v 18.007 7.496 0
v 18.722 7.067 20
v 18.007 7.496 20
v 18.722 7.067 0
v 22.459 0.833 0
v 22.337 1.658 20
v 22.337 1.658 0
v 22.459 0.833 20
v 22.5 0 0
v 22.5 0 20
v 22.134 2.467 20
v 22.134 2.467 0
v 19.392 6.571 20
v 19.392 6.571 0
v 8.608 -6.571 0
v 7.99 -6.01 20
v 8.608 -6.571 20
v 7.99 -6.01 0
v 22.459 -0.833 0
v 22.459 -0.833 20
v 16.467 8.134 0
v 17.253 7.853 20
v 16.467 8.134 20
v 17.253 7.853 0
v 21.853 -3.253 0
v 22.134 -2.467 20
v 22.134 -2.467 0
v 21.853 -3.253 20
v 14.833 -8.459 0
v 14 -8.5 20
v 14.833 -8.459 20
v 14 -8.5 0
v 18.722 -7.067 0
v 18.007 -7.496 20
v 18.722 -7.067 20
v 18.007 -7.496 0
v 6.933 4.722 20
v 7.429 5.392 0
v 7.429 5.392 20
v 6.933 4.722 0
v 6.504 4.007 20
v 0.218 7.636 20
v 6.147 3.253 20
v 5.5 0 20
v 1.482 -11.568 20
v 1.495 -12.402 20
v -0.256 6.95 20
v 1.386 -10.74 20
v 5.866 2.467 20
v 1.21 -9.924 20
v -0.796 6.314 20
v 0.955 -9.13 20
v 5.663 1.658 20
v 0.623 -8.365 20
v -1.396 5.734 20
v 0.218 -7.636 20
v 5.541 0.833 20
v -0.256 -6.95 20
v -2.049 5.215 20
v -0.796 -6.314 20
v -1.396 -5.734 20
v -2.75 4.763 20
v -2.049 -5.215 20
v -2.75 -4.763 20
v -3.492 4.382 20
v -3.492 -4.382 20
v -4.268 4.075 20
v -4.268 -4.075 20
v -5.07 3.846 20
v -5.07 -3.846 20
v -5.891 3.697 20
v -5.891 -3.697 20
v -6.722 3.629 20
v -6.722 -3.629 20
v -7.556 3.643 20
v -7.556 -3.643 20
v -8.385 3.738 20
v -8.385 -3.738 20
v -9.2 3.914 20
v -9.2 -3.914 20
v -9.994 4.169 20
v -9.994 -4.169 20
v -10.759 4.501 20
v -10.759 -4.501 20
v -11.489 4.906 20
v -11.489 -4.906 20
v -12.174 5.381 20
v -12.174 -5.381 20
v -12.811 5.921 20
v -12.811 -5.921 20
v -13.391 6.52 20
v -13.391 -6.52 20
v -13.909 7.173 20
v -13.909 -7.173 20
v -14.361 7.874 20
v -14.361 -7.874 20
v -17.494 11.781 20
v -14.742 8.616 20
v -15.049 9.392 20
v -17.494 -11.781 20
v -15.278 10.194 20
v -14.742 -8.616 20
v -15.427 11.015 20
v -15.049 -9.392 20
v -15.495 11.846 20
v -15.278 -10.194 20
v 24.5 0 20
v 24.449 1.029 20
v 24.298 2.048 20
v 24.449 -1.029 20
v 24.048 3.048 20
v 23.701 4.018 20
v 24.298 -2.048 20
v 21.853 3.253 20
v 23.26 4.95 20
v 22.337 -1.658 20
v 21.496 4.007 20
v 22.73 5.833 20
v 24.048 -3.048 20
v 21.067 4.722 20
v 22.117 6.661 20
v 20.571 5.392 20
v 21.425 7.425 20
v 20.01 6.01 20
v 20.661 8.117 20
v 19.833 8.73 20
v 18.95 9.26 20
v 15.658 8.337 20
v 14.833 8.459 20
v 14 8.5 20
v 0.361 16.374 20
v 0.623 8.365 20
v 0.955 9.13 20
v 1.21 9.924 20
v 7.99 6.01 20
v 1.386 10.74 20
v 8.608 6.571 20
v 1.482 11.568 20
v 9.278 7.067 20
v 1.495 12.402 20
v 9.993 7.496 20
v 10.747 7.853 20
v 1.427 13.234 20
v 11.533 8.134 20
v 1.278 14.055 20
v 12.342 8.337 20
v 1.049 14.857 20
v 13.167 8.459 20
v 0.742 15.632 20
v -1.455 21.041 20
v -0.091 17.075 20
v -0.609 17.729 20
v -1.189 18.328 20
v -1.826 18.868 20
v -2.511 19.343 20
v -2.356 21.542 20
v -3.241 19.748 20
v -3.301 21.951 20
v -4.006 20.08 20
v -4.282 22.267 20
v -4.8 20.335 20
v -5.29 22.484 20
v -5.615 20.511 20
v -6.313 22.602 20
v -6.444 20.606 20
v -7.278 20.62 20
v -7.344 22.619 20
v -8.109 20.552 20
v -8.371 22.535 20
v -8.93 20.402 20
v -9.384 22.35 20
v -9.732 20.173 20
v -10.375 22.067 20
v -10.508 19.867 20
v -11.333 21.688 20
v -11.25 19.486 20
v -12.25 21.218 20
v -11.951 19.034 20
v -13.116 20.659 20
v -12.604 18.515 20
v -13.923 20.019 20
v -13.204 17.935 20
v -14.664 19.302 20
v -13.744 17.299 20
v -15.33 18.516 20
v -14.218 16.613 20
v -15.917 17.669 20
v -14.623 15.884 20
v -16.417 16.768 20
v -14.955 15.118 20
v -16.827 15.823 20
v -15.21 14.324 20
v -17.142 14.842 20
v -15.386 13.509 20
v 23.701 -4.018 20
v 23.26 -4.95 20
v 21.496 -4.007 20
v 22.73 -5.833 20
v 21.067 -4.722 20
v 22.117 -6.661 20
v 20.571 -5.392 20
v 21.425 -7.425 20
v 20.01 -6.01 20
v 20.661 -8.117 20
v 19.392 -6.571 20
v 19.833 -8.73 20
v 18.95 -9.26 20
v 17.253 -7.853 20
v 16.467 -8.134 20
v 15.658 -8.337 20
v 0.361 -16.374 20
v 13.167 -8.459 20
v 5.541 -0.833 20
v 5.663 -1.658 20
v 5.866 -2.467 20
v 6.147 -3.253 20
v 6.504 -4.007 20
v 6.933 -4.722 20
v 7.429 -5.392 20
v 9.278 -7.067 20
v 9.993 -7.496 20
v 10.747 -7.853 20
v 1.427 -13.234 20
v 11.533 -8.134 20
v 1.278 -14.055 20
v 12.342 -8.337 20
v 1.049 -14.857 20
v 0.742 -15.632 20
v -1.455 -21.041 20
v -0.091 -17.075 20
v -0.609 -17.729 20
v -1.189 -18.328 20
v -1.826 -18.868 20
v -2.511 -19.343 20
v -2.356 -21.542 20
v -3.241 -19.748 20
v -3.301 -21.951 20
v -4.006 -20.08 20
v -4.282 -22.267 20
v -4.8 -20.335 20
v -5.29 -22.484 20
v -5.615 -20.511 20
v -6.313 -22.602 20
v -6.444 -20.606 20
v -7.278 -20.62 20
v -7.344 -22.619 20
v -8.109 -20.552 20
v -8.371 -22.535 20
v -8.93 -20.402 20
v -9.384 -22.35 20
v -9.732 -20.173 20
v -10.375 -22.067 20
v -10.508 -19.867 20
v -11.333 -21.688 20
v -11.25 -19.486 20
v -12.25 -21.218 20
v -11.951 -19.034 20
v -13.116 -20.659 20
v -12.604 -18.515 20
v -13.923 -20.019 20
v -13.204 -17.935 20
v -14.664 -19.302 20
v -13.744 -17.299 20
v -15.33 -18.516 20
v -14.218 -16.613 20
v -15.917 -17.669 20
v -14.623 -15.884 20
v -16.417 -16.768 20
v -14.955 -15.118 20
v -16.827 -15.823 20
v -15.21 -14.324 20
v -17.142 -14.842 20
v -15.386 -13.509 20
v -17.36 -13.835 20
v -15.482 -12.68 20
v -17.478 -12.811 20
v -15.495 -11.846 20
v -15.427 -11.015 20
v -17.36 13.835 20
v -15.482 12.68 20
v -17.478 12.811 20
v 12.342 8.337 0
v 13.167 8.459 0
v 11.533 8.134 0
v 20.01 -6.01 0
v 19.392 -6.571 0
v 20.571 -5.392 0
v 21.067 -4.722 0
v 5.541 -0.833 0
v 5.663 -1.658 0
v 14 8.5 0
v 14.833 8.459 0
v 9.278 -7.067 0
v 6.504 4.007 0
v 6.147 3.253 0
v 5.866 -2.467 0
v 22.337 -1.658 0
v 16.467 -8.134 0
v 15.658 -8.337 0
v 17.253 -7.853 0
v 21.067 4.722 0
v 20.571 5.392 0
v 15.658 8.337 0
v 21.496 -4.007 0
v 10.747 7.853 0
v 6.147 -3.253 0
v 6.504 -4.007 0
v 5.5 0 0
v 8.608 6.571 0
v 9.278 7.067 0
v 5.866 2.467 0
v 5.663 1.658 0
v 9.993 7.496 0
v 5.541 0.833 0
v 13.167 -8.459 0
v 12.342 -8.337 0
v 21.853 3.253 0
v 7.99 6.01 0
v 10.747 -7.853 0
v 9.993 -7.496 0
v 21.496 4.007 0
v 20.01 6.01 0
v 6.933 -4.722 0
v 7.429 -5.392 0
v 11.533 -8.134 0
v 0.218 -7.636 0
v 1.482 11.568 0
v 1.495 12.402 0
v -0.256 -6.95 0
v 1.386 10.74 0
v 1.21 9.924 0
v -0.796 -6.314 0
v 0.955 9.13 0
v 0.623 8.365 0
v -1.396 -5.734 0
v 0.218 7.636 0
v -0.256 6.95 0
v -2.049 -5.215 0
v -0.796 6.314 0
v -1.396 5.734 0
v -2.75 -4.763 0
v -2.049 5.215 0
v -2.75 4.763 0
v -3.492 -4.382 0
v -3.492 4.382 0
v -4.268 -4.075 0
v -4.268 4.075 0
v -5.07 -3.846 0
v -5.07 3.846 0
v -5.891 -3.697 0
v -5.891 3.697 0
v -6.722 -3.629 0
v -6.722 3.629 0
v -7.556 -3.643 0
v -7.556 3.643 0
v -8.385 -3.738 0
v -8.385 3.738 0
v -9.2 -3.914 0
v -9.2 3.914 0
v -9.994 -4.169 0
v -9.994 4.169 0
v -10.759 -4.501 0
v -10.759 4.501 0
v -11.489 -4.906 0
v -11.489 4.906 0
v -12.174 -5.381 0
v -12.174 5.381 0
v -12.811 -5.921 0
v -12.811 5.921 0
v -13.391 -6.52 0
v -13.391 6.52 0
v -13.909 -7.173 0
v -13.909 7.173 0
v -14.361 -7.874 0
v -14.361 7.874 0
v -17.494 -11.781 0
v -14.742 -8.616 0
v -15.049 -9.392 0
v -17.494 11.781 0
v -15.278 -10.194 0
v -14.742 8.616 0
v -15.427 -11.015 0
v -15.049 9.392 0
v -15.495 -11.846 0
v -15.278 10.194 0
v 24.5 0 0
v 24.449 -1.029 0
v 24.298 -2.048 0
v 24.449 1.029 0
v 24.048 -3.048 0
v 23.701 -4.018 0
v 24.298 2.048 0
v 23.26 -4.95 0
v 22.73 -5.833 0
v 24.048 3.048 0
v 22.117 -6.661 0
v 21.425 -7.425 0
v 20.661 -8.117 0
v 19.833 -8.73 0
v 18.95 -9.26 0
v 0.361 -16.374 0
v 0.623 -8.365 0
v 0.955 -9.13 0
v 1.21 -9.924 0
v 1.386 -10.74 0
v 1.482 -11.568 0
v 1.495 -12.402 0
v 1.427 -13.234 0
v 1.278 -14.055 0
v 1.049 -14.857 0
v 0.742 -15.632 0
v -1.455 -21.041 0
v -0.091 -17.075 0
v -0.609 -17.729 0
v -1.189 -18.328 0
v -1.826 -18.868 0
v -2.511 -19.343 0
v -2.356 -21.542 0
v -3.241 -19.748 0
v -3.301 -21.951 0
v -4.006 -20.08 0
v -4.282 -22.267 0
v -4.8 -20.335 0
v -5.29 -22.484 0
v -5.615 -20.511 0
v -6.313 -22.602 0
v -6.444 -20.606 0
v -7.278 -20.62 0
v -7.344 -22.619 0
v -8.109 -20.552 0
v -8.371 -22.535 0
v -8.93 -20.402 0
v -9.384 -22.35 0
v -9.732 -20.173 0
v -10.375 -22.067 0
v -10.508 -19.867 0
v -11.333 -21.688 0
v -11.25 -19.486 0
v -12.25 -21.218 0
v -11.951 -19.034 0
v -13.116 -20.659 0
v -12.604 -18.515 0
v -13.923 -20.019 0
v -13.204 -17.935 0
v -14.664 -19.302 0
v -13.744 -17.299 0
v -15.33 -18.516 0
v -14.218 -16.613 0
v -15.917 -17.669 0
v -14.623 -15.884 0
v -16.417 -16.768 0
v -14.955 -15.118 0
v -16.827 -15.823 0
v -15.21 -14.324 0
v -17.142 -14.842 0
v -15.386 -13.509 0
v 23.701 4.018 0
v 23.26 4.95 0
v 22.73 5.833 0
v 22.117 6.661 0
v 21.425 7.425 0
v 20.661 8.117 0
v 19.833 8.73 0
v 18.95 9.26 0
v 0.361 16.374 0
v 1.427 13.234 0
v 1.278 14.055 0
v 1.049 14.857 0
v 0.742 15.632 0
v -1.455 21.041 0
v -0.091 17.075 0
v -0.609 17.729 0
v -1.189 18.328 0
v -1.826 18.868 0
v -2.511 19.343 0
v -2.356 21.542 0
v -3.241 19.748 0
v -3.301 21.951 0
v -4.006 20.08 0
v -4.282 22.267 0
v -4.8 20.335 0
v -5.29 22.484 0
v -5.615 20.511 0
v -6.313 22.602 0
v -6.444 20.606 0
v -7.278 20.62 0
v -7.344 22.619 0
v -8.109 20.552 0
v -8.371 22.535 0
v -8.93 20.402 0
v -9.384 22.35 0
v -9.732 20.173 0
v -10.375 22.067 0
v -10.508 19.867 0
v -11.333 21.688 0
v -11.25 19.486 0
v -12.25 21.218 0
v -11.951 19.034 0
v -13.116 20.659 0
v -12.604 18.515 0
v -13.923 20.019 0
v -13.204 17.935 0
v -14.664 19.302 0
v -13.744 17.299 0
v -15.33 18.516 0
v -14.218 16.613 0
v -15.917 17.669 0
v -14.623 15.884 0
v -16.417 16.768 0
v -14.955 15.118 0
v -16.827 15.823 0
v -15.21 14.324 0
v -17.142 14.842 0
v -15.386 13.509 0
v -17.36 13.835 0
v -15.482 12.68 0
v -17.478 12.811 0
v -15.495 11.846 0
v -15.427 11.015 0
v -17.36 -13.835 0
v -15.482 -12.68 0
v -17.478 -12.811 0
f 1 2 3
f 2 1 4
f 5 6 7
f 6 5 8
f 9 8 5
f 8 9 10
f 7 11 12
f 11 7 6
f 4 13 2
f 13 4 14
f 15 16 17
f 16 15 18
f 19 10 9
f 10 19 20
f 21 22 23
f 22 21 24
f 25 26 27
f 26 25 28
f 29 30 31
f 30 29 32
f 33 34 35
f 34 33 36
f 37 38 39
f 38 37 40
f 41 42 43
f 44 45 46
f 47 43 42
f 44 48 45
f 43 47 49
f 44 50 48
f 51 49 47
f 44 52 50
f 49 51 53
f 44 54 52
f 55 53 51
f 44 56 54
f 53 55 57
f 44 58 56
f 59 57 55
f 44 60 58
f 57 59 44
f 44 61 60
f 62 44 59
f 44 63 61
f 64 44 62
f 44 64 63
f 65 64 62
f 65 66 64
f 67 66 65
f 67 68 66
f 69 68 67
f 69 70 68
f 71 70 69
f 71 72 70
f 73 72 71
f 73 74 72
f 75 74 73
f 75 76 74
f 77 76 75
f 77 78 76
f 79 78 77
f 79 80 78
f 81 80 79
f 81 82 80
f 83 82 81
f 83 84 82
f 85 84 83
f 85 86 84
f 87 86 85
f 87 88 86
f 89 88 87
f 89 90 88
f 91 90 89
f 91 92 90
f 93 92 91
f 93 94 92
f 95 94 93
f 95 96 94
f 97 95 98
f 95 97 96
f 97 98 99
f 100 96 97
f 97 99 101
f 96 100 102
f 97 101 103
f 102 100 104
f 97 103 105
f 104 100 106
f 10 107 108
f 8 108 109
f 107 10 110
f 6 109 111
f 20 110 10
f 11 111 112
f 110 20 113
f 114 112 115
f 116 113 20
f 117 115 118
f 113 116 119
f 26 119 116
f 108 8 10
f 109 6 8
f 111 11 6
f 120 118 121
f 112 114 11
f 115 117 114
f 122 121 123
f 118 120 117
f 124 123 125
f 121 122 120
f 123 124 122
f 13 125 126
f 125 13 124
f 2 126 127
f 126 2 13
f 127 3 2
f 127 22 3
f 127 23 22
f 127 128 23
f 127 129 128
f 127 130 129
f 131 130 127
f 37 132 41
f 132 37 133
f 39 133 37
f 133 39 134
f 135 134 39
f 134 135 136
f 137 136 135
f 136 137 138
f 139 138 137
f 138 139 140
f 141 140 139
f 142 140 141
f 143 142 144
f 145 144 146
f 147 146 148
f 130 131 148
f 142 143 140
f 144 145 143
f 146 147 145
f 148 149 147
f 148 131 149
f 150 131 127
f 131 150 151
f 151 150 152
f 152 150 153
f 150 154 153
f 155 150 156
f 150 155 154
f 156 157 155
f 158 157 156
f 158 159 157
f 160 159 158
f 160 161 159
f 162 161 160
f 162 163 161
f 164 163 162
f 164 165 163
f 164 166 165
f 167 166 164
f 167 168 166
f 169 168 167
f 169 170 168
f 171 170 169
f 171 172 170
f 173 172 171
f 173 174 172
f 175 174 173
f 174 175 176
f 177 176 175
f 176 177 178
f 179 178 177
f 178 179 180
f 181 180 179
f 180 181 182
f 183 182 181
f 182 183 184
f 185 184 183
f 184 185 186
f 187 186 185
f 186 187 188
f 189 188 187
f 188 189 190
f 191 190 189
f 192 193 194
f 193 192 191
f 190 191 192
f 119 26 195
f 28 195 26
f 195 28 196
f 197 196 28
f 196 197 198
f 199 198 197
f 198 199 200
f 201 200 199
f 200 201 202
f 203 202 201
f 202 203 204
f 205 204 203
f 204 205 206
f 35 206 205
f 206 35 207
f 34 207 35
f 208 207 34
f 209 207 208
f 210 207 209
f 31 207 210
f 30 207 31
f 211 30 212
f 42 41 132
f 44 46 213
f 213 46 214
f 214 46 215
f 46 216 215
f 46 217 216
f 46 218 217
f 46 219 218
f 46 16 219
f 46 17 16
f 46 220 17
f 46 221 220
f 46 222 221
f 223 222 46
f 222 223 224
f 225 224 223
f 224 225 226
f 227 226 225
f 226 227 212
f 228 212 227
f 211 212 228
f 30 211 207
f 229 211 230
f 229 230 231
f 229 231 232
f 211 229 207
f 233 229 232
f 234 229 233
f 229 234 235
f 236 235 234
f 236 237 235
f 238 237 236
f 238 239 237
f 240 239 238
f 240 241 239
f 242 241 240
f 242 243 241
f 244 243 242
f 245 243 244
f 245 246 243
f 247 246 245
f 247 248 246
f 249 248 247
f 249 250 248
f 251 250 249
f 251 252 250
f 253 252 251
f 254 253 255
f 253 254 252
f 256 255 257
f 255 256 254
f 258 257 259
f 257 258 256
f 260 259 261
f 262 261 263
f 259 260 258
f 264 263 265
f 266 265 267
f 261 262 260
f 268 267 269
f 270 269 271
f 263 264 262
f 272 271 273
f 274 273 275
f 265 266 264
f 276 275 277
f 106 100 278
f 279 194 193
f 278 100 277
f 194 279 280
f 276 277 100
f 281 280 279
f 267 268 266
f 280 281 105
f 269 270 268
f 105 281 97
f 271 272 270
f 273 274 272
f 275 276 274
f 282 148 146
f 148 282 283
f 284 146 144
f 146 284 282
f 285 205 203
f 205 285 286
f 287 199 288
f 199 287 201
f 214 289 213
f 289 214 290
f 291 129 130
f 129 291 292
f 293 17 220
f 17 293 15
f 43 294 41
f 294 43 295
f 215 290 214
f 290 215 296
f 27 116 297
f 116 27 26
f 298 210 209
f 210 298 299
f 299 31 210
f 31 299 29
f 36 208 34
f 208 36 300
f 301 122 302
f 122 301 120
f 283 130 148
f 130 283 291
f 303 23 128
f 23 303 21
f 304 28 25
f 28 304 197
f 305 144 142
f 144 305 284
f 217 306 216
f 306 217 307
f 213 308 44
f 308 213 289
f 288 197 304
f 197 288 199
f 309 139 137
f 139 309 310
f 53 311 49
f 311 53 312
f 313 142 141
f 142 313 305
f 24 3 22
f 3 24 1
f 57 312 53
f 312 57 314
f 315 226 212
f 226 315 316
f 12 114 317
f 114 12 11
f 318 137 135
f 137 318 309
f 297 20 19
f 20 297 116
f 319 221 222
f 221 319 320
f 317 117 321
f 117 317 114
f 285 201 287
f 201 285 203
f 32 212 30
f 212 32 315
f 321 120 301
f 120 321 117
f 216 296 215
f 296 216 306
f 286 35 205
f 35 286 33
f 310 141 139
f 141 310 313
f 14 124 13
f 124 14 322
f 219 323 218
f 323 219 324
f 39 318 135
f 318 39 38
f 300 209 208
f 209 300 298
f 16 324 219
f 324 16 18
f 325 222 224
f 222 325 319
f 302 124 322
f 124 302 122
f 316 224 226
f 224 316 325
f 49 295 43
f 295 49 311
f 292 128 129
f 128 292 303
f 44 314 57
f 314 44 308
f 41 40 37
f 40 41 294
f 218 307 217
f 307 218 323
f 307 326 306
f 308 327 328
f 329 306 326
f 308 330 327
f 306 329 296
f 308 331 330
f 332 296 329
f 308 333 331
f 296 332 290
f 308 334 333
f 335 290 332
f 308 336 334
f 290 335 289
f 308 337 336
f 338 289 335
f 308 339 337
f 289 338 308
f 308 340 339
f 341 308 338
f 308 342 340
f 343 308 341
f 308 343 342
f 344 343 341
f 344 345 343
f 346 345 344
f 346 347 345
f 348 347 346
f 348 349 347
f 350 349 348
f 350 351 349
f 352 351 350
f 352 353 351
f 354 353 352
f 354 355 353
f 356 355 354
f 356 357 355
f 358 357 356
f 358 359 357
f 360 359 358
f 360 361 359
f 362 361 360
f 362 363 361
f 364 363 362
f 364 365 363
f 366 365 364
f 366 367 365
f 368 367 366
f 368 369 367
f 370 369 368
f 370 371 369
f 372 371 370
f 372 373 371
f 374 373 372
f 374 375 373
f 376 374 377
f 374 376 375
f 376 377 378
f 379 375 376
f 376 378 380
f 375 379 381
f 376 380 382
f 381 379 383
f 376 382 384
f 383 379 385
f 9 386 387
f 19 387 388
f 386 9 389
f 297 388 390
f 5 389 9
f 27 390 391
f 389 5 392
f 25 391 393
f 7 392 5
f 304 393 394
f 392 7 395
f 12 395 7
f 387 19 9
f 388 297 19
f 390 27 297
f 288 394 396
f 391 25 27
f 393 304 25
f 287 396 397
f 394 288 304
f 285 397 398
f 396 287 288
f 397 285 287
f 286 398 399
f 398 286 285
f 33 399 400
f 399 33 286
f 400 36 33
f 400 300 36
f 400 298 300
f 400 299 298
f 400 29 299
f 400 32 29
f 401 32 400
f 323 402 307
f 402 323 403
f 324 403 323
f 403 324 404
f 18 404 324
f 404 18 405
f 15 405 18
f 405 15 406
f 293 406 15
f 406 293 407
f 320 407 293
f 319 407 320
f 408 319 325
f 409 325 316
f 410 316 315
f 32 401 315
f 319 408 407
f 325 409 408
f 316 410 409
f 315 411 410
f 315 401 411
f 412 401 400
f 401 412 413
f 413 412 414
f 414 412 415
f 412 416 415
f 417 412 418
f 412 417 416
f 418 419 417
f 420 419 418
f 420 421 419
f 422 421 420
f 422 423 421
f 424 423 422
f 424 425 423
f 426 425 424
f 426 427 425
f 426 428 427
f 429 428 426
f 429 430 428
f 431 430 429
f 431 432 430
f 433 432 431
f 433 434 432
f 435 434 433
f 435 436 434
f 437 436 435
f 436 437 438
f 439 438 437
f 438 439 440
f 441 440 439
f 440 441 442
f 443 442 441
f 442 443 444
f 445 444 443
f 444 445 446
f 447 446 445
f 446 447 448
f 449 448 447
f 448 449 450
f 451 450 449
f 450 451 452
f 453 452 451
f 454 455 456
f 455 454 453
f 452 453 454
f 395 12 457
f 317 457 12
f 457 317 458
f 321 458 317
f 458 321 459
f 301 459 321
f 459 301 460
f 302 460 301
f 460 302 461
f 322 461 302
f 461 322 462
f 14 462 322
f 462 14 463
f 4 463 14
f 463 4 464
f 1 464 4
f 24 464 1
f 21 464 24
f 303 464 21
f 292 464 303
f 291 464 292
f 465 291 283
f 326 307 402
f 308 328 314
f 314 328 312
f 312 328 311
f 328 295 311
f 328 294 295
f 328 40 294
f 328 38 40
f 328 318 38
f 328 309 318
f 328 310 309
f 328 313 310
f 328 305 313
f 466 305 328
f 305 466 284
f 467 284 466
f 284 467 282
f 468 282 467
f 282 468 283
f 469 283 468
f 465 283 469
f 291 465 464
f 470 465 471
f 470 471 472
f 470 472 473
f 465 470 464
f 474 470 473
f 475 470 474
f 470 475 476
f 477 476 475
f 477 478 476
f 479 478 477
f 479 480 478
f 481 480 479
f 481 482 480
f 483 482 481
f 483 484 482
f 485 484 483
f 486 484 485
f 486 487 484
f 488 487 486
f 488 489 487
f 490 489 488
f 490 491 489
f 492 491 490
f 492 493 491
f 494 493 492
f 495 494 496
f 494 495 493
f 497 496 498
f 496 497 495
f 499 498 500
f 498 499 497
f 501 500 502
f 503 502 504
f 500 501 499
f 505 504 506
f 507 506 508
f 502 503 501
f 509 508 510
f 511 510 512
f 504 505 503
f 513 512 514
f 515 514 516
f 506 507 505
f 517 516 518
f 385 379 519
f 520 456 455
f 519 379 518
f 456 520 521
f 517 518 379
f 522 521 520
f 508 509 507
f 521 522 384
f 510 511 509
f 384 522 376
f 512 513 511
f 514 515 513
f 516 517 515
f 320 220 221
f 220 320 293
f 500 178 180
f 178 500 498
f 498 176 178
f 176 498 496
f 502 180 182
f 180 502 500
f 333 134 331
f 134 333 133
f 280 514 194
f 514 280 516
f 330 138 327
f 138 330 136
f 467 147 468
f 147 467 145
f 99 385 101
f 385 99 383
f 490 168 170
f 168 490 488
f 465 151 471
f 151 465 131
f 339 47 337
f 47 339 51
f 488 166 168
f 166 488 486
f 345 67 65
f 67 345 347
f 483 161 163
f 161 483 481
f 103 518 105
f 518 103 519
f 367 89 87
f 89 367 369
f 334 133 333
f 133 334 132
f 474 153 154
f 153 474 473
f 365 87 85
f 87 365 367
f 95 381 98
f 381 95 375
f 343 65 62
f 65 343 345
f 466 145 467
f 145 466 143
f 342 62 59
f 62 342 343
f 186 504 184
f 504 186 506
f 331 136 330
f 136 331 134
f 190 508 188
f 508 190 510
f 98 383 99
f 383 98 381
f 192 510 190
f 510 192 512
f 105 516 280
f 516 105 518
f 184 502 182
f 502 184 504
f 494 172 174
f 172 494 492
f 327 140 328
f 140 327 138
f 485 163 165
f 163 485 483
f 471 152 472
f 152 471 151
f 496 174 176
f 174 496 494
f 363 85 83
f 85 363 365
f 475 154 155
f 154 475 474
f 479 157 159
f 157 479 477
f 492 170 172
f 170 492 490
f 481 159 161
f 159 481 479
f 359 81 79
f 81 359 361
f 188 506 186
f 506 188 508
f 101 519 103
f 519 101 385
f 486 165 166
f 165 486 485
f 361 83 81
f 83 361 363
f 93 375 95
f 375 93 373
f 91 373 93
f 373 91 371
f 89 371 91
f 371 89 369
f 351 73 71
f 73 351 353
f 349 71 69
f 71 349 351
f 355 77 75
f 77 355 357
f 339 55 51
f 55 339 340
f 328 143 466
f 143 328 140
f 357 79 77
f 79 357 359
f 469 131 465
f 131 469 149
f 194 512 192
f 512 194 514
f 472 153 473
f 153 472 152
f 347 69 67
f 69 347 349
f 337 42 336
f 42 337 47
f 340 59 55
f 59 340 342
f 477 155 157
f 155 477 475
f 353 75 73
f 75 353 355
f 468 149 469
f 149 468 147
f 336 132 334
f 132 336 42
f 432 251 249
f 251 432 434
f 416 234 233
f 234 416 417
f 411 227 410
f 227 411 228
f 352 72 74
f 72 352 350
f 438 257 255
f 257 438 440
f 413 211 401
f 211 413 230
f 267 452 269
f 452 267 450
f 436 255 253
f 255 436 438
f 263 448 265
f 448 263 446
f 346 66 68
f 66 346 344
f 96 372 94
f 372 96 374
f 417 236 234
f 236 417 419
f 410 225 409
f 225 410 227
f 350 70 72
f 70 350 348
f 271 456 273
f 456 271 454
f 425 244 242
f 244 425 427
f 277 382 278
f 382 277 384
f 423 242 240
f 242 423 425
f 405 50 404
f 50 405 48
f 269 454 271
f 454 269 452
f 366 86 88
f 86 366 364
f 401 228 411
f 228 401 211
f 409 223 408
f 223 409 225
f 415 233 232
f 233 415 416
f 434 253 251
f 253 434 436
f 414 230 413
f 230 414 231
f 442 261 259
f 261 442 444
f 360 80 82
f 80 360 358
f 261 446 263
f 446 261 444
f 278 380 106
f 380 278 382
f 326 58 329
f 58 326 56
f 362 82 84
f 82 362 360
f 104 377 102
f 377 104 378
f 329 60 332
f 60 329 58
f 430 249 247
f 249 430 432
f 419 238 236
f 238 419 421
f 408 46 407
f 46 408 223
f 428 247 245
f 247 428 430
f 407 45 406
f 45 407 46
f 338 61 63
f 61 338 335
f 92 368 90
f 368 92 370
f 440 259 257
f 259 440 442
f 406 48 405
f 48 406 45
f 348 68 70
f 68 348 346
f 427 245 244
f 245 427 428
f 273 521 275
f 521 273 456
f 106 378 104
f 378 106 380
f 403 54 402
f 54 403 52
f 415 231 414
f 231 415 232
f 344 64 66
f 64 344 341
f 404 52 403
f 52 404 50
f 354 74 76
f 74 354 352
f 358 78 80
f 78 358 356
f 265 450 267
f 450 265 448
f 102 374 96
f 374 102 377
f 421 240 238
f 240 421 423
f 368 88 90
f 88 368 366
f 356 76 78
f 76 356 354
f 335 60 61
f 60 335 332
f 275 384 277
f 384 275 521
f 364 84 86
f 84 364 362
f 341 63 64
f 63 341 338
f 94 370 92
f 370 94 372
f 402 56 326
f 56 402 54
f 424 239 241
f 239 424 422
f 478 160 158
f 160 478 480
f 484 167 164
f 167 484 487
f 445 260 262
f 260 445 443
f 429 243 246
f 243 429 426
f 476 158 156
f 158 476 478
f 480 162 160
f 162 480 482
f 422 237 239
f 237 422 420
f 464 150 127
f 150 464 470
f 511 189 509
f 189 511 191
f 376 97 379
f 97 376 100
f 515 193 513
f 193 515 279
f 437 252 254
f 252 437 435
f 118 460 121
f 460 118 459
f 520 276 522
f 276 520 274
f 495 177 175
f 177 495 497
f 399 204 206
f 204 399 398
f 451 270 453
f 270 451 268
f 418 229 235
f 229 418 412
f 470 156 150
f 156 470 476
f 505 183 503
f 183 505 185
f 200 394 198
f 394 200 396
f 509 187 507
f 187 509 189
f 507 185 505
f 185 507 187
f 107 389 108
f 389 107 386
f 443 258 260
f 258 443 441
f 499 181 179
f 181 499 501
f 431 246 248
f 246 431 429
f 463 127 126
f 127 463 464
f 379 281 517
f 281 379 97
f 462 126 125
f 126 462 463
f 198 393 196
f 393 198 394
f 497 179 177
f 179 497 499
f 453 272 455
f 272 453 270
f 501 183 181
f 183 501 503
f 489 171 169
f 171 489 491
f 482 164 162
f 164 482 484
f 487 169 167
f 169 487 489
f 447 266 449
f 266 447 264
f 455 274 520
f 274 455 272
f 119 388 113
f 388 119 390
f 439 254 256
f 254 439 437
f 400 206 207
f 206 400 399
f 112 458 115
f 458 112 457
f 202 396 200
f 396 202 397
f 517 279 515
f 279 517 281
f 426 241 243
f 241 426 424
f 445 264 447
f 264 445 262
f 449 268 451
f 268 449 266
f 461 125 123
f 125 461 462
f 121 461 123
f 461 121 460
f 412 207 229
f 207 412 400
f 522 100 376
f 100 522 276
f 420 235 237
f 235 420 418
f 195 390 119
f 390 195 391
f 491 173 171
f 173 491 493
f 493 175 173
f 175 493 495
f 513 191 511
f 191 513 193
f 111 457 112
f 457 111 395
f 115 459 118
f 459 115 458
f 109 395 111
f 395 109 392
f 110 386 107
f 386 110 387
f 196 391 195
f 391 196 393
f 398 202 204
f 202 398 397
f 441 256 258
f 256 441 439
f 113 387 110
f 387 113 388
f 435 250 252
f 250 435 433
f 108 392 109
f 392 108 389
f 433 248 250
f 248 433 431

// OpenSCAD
HOLE_DIAM = 16 + 1;
WIDTH = 20;
OFFSET=12;
BEVEL = 2;

difference() {
    hull() {
        for (r=[0:120:360]) {
            rotate([0, 0, r]) translate([OFFSET + BEVEL, 0, 0]) cylinder(d=(2 * BEVEL) + HOLE_DIAM, h=WIDTH, $fn=64);
        }
    }
    for (r=[0:120:360]) {
        rotate([0, 0, r]) translate([OFFSET + BEVEL, 0, 0]) cylinder(d=HOLE_DIAM, h=WIDTH, $fn=64);
    }
}
